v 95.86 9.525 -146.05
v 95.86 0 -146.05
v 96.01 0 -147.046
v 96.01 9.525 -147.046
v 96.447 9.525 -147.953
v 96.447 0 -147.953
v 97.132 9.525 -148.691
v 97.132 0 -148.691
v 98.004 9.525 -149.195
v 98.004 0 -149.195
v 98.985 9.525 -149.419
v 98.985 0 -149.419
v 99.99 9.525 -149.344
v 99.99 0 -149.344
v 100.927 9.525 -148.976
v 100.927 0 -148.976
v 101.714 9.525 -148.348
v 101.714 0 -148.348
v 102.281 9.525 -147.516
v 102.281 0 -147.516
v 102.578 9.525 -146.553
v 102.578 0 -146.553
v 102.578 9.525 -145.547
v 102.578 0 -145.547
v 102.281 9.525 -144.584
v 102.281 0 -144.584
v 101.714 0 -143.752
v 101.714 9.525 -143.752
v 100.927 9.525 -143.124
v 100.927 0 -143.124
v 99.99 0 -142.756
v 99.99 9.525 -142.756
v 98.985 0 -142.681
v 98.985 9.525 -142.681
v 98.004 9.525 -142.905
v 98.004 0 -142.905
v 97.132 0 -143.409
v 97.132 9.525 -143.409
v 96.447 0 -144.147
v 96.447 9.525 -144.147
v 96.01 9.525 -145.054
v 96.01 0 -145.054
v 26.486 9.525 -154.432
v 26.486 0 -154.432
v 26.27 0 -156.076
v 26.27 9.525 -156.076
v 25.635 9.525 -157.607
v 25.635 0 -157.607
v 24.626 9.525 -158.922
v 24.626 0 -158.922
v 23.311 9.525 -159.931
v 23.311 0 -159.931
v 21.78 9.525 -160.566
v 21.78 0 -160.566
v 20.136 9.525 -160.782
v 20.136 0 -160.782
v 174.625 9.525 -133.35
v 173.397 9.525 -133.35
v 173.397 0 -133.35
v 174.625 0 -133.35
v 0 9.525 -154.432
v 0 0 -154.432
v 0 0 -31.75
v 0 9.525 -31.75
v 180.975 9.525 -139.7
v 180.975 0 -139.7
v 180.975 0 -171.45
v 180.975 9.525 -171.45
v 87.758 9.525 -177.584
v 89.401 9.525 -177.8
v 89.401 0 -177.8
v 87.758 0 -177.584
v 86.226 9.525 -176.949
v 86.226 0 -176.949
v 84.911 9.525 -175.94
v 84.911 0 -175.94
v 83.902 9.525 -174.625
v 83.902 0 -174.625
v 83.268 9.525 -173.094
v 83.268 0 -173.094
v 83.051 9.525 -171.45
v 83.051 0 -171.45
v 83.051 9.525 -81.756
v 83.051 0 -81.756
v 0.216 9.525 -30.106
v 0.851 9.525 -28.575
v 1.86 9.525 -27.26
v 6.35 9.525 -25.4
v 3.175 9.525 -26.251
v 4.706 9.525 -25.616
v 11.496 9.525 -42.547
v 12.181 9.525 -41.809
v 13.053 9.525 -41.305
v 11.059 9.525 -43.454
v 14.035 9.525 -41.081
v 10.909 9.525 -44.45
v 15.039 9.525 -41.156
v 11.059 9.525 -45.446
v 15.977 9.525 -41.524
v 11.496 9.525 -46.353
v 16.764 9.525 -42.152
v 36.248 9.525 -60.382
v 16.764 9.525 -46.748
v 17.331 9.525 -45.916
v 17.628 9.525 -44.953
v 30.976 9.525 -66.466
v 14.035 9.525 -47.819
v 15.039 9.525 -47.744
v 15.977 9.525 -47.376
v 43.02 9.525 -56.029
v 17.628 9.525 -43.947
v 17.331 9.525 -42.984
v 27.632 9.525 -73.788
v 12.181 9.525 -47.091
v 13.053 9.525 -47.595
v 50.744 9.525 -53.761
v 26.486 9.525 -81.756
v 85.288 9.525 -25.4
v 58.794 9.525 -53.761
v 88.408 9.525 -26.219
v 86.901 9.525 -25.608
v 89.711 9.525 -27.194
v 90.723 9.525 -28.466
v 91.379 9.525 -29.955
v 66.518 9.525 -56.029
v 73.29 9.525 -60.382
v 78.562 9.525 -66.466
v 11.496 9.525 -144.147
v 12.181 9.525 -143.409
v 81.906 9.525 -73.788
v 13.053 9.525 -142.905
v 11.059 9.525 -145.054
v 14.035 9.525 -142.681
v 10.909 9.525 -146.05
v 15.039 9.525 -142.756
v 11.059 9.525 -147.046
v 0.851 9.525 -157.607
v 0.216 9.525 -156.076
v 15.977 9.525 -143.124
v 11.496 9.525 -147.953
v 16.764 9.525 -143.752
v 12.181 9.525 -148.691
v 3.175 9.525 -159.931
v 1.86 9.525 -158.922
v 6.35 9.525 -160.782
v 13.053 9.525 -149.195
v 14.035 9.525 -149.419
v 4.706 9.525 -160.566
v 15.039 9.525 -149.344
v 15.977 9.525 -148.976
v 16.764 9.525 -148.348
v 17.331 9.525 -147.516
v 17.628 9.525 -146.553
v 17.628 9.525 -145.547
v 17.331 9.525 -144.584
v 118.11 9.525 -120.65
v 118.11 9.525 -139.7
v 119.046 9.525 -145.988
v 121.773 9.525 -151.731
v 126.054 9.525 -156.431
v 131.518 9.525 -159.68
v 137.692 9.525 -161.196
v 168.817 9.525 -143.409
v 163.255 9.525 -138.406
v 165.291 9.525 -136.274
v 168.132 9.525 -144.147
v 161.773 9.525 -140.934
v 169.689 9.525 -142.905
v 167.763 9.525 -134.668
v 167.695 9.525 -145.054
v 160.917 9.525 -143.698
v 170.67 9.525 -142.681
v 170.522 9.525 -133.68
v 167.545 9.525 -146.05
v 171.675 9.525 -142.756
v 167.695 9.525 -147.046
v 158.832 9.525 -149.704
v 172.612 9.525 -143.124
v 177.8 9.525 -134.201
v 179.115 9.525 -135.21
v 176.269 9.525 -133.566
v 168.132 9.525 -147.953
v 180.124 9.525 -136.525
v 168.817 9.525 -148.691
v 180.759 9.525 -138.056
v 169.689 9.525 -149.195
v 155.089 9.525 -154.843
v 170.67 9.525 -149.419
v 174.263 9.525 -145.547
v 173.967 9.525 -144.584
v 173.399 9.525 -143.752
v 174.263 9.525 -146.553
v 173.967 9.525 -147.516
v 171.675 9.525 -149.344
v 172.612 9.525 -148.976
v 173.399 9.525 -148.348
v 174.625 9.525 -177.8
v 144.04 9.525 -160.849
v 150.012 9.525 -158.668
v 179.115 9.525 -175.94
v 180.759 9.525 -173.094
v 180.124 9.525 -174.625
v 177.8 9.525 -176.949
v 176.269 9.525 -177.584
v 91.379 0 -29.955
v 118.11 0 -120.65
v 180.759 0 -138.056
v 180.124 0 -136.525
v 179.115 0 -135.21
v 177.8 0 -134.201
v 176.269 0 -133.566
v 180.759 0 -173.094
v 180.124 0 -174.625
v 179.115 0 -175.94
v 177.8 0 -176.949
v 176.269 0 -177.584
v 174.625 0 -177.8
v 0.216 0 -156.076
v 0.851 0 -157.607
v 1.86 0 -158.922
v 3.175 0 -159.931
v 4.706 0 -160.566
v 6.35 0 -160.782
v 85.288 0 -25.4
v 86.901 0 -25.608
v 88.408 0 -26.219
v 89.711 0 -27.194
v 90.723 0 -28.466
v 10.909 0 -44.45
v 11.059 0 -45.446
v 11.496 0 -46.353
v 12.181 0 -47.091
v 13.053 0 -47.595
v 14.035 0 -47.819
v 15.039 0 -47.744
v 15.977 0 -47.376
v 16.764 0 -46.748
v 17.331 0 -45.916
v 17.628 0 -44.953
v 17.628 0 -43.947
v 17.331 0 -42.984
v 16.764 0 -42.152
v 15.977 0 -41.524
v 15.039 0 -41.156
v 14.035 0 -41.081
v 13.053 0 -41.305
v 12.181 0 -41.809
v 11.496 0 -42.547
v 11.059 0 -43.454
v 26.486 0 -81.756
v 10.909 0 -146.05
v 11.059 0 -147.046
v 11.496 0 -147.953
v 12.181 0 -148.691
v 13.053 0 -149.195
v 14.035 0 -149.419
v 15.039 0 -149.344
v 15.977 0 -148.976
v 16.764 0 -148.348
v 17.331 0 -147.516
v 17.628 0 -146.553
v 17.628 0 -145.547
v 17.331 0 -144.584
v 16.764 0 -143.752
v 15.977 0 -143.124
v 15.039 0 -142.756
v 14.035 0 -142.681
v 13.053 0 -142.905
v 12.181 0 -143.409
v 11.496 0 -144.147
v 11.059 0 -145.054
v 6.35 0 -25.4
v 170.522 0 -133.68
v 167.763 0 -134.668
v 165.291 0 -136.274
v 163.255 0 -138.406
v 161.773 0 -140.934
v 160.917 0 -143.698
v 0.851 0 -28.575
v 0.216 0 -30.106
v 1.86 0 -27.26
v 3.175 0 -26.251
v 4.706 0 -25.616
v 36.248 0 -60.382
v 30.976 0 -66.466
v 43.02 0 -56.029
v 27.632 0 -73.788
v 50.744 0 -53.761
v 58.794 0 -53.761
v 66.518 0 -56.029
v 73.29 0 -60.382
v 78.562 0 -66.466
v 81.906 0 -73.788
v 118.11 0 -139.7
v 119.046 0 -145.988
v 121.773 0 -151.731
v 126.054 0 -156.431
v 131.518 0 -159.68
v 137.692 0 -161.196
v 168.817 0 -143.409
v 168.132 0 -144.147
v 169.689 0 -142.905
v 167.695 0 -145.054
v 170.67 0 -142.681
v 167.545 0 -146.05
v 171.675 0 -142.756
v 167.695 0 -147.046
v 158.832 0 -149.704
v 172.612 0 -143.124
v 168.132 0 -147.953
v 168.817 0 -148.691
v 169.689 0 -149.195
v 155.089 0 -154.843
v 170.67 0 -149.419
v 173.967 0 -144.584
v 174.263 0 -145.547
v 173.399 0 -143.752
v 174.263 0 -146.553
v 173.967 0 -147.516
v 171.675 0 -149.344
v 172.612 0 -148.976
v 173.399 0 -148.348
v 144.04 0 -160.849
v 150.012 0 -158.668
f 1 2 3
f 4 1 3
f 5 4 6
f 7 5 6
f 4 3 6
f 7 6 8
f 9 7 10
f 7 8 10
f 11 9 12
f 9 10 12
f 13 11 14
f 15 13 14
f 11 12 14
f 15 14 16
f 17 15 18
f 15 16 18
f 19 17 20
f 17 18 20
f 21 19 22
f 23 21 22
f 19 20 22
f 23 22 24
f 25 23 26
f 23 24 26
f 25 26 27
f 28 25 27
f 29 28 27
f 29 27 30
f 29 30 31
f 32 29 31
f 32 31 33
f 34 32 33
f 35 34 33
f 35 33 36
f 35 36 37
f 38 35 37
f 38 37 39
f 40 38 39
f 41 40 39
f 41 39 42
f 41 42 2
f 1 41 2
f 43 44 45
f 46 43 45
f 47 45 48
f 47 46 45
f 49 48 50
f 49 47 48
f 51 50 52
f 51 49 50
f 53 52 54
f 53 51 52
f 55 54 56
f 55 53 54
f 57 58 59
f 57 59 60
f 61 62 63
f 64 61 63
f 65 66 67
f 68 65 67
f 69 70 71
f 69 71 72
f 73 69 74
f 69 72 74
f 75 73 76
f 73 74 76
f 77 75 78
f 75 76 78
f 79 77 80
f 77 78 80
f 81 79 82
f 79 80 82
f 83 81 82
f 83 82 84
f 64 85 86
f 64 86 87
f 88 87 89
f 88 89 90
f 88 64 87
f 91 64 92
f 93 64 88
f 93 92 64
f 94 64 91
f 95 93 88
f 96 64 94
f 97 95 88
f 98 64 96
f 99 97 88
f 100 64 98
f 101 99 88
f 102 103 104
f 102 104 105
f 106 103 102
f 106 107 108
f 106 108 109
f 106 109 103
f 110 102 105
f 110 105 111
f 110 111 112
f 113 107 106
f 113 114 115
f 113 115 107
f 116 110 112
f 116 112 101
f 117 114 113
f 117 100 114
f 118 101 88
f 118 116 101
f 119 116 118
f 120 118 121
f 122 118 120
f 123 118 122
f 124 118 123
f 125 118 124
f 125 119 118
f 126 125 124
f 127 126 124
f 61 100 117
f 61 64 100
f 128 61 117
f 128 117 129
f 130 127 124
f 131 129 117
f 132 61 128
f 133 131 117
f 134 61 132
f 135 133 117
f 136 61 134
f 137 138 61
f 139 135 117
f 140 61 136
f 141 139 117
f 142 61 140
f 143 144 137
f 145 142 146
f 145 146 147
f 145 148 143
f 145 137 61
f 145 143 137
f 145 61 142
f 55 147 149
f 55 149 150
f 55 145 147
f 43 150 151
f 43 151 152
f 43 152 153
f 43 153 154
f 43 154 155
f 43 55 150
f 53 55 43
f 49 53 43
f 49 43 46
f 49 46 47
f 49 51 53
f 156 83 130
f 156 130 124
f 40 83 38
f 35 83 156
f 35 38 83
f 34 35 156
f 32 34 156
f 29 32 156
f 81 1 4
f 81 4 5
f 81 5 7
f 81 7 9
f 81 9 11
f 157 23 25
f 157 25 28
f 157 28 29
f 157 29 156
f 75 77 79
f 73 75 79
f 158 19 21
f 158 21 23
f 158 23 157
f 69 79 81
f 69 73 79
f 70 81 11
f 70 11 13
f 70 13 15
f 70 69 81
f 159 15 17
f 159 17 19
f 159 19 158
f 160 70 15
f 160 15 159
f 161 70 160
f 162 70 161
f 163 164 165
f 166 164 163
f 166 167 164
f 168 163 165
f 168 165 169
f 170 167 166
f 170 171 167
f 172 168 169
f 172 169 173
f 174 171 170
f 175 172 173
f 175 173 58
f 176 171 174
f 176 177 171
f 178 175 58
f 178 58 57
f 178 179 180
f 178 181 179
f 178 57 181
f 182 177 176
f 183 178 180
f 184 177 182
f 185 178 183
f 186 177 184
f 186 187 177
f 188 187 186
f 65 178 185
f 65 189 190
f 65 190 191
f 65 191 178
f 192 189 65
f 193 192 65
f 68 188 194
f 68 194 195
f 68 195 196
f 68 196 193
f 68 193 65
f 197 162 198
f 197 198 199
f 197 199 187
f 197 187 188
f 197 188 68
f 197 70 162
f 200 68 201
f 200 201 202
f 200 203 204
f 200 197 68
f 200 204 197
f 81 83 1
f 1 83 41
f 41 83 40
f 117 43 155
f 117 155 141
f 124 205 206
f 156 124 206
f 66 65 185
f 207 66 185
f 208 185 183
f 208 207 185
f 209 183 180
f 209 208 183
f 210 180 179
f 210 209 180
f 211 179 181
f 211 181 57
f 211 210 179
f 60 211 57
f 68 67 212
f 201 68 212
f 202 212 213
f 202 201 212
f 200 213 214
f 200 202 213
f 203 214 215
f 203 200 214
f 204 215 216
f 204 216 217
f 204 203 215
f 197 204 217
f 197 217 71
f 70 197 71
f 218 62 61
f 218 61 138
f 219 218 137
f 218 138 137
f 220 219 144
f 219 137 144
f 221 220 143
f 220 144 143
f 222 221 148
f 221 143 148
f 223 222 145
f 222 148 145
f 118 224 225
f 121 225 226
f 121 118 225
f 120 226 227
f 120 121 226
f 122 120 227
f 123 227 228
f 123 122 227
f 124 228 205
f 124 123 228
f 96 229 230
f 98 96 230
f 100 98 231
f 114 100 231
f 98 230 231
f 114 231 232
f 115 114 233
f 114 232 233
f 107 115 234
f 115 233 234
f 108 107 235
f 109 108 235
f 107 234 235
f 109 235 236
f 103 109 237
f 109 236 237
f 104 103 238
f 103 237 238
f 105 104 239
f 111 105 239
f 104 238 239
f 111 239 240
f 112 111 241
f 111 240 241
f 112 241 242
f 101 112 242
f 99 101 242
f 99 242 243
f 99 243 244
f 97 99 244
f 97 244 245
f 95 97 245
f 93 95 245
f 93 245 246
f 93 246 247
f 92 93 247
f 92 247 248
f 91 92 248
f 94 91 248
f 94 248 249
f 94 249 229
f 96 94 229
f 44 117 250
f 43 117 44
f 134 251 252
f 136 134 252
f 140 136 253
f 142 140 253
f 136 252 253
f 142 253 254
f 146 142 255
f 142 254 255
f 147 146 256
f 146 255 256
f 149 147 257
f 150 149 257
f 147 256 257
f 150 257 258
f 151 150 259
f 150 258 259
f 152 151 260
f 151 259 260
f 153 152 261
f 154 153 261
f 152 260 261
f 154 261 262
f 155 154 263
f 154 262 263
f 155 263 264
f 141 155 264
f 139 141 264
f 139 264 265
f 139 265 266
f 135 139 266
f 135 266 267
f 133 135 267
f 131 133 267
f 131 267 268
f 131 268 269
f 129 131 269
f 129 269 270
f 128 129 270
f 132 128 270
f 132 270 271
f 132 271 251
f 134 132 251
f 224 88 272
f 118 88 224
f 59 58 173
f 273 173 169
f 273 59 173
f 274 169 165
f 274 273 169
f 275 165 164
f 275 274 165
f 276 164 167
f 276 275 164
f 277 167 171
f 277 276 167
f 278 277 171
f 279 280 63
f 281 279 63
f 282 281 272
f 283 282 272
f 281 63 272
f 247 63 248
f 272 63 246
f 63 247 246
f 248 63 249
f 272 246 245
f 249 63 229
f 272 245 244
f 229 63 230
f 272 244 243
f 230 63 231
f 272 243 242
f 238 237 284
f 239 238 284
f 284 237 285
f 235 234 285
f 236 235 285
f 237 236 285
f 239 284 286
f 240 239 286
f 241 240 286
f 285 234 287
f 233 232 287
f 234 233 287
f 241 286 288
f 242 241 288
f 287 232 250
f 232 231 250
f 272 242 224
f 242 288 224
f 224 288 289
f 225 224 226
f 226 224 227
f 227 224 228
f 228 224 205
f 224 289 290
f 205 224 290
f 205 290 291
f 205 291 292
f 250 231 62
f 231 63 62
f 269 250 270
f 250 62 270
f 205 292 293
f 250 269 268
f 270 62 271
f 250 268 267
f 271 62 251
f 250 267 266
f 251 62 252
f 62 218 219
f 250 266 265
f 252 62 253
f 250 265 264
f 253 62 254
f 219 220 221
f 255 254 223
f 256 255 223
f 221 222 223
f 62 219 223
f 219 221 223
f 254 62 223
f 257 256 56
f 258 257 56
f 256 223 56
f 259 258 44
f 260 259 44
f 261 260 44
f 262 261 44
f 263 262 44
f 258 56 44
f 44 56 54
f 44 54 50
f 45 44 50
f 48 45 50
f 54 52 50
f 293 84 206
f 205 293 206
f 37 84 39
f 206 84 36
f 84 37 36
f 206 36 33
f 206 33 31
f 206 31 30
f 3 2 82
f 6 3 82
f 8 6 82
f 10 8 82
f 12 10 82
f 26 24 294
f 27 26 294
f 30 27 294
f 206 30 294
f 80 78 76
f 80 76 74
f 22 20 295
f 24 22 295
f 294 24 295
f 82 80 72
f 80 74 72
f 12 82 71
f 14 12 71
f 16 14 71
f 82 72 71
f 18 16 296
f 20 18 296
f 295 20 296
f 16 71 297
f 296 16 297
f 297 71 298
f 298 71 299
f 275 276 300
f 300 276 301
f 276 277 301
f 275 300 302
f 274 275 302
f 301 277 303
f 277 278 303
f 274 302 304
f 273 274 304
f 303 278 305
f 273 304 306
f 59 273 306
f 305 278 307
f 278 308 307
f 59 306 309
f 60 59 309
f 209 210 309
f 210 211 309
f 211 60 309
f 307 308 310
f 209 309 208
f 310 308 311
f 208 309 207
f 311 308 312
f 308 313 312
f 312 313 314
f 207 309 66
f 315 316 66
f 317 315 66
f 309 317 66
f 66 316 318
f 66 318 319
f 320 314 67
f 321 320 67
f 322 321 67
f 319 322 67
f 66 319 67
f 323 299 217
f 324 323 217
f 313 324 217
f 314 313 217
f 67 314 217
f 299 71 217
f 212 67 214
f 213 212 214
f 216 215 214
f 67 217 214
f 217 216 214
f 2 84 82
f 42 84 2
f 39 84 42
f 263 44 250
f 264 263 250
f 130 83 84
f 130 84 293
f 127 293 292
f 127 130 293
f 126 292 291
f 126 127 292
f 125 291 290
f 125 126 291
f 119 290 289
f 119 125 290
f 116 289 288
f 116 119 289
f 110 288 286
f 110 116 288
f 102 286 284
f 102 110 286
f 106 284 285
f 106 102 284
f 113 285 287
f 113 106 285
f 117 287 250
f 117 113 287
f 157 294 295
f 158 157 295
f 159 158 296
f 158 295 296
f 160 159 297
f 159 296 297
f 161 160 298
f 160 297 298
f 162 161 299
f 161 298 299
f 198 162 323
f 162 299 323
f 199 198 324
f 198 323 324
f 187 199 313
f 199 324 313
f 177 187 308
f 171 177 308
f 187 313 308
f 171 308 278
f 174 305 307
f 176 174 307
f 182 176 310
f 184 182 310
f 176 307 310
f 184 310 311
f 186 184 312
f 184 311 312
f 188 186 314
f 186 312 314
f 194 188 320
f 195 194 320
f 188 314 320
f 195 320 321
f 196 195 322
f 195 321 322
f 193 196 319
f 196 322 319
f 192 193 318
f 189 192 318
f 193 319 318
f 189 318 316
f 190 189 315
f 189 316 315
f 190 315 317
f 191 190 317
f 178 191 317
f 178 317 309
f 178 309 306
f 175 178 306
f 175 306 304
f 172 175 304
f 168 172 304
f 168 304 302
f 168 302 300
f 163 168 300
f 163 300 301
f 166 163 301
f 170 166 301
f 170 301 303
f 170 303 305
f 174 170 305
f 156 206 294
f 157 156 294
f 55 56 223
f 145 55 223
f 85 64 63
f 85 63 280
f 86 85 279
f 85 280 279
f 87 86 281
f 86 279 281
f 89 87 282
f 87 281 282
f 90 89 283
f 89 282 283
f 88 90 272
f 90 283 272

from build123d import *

# Parameters (mm, degrees)
BOSS_EXTRUDE1_DEPTH     = 9.525
SKETCH2_W               = 94.331668948
SKETCH2_H               = 25.4
CUT_EXTRUDE1_DEPTH      = 10.525
FILLET1_R               = 6.35
FILLET2_R               = 6.35
F_1_4_CLEARANCE_HOLE1_D = 6.7564
SKETCH5_W               = 19.685
SKETCH5_H               = 12.7
CUT_EXTRUDE2_DEPTH      = 10.525
FILLET3_R               = 6.35
CUT_EXTRUDE3_DEPTH      = 10.525
FILLET4_R               = 12.7
FILLET5_R               = 6.35


with BuildPart() as part:
    # Sketch1 → Boss-Extrude1 (new body)
    with BuildSketch(Plane(origin=(0, 0, 0), x_dir=(1, 0, 0), z_dir=(0, 1, 0))):
        with BuildLine():
            Line((28.575, 81.75625), (28.575, 160.782))
            Line((28.575, 160.782), (0, 160.782))
            Line((0, 160.782), (0, 0))
            Line((0, 0), (82.55, 0))
            Line((82.55, 0), (118.11, 120.65))
            Line((118.11, 120.65), (118.11, 139.7))
            ThreePointArc((118.11, 139.7), (139.7, 161.29), (161.29, 139.7))
            Line((161.29, 139.7), (161.29, 120.65))
            Line((161.29, 120.65), (180.975, 120.65))
            Line((180.975, 120.65), (180.975, 139.7))
            Line((180.975, 139.7), (180.975, 177.8))
            Line((180.975, 177.8), (121.7041, 177.8))
            Line((121.7041, 177.8), (80.9625, 177.8))
            Line((80.9625, 177.8), (80.9625, 81.75625))
            ThreePointArc((80.9625, 81.75625), (54.76875, 55.5625), (28.575, 81.75625))
        make_face()
    extrude(amount=BOSS_EXTRUDE1_DEPTH)

    # Sketch2 → Cut-Extrude1 (cut, through all)
    with BuildSketch(Plane(origin=(0, 9.525, 0), x_dir=(1, 0, 0), z_dir=(0, 1, 0))):
        with Locations((47.165834474, 12.7)):
            Rectangle(SKETCH2_W, SKETCH2_H)
    extrude(amount=-CUT_EXTRUDE1_DEPTH, mode=Mode.SUBTRACT)

    # Fillet1
    fillet1_edges = [part.edges().sort_by_distance(p)[0] for p in [
        (0, 4.7625, -25.4),
    ]]
    fillet(fillet1_edges, radius=FILLET1_R)

    # Fillet2
    fillet2_edges = [part.edges().sort_by_distance(p)[0] for p in [
        (0, 4.7625, -160.782),
        (180.975, 4.7625, -177.8),
        (180.975, 4.7625, -120.65),
        (90.036315789, 4.7625, -25.4),
    ]]
    fillet(fillet2_edges, radius=FILLET2_R)

    # 1/4 Clearance Hole1 (through all)
    with Locations(Plane(origin=(0, 9.525, 0), x_dir=(1, 0, 0), z_dir=(0, 1, 0))):
        with Locations((14.2875, 146.05), (14.2875, 44.45), (99.2378, 146.05), (170.92295, 146.05)):
            Hole(F_1_4_CLEARANCE_HOLE1_D / 2)

    # Sketch5 → Cut-Extrude2 (cut, through all)
    with BuildSketch(Plane(origin=(0, 9.525, 0), x_dir=(1, 0, 0), z_dir=(0, 1, 0))):
        with Locations((171.1325, 127)):
            Rectangle(SKETCH5_W, SKETCH5_H)
    extrude(amount=-CUT_EXTRUDE2_DEPTH, mode=Mode.SUBTRACT)

    # Fillet3
    fillet3_edges = [part.edges().sort_by_distance(p)[0] for p in [
        (180.975, 4.7625, -133.35),
    ]]
    fillet(fillet3_edges, radius=FILLET3_R)

    # Sketch6 → Cut-Extrude3 (cut, through all)
    with BuildSketch(Plane(origin=(0, 9.525, 0), x_dir=(1, 0, 0), z_dir=(0, 1, 0))):
        with BuildLine():
            Line((26.486121599, 81.75625), (26.486121599, 177.8))
            Line((26.486121599, 177.8), (83.051378401, 177.8))
            Line((83.051378401, 177.8), (83.051378401, 81.75625))
            ThreePointArc((83.051378401, 81.75625), (54.76875, 53.473621599), (26.486121599, 81.75625))
        make_face()
    extrude(amount=-CUT_EXTRUDE3_DEPTH, mode=Mode.SUBTRACT)

    # Fillet4
    fillet4_edges = [part.edges().sort_by_distance(p)[0] for p in [
        (161.29, 4.7625, -133.35),
    ]]
    fillet(fillet4_edges, radius=FILLET4_R)

    # Fillet5
    fillet5_edges = [part.edges().sort_by_distance(p)[0] for p in [
        (26.486121599, 4.7625, -160.782),
        (83.051378401, 4.7625, -177.8),
    ]]
    fillet(fillet5_edges, radius=FILLET5_R)


solid = part.part
